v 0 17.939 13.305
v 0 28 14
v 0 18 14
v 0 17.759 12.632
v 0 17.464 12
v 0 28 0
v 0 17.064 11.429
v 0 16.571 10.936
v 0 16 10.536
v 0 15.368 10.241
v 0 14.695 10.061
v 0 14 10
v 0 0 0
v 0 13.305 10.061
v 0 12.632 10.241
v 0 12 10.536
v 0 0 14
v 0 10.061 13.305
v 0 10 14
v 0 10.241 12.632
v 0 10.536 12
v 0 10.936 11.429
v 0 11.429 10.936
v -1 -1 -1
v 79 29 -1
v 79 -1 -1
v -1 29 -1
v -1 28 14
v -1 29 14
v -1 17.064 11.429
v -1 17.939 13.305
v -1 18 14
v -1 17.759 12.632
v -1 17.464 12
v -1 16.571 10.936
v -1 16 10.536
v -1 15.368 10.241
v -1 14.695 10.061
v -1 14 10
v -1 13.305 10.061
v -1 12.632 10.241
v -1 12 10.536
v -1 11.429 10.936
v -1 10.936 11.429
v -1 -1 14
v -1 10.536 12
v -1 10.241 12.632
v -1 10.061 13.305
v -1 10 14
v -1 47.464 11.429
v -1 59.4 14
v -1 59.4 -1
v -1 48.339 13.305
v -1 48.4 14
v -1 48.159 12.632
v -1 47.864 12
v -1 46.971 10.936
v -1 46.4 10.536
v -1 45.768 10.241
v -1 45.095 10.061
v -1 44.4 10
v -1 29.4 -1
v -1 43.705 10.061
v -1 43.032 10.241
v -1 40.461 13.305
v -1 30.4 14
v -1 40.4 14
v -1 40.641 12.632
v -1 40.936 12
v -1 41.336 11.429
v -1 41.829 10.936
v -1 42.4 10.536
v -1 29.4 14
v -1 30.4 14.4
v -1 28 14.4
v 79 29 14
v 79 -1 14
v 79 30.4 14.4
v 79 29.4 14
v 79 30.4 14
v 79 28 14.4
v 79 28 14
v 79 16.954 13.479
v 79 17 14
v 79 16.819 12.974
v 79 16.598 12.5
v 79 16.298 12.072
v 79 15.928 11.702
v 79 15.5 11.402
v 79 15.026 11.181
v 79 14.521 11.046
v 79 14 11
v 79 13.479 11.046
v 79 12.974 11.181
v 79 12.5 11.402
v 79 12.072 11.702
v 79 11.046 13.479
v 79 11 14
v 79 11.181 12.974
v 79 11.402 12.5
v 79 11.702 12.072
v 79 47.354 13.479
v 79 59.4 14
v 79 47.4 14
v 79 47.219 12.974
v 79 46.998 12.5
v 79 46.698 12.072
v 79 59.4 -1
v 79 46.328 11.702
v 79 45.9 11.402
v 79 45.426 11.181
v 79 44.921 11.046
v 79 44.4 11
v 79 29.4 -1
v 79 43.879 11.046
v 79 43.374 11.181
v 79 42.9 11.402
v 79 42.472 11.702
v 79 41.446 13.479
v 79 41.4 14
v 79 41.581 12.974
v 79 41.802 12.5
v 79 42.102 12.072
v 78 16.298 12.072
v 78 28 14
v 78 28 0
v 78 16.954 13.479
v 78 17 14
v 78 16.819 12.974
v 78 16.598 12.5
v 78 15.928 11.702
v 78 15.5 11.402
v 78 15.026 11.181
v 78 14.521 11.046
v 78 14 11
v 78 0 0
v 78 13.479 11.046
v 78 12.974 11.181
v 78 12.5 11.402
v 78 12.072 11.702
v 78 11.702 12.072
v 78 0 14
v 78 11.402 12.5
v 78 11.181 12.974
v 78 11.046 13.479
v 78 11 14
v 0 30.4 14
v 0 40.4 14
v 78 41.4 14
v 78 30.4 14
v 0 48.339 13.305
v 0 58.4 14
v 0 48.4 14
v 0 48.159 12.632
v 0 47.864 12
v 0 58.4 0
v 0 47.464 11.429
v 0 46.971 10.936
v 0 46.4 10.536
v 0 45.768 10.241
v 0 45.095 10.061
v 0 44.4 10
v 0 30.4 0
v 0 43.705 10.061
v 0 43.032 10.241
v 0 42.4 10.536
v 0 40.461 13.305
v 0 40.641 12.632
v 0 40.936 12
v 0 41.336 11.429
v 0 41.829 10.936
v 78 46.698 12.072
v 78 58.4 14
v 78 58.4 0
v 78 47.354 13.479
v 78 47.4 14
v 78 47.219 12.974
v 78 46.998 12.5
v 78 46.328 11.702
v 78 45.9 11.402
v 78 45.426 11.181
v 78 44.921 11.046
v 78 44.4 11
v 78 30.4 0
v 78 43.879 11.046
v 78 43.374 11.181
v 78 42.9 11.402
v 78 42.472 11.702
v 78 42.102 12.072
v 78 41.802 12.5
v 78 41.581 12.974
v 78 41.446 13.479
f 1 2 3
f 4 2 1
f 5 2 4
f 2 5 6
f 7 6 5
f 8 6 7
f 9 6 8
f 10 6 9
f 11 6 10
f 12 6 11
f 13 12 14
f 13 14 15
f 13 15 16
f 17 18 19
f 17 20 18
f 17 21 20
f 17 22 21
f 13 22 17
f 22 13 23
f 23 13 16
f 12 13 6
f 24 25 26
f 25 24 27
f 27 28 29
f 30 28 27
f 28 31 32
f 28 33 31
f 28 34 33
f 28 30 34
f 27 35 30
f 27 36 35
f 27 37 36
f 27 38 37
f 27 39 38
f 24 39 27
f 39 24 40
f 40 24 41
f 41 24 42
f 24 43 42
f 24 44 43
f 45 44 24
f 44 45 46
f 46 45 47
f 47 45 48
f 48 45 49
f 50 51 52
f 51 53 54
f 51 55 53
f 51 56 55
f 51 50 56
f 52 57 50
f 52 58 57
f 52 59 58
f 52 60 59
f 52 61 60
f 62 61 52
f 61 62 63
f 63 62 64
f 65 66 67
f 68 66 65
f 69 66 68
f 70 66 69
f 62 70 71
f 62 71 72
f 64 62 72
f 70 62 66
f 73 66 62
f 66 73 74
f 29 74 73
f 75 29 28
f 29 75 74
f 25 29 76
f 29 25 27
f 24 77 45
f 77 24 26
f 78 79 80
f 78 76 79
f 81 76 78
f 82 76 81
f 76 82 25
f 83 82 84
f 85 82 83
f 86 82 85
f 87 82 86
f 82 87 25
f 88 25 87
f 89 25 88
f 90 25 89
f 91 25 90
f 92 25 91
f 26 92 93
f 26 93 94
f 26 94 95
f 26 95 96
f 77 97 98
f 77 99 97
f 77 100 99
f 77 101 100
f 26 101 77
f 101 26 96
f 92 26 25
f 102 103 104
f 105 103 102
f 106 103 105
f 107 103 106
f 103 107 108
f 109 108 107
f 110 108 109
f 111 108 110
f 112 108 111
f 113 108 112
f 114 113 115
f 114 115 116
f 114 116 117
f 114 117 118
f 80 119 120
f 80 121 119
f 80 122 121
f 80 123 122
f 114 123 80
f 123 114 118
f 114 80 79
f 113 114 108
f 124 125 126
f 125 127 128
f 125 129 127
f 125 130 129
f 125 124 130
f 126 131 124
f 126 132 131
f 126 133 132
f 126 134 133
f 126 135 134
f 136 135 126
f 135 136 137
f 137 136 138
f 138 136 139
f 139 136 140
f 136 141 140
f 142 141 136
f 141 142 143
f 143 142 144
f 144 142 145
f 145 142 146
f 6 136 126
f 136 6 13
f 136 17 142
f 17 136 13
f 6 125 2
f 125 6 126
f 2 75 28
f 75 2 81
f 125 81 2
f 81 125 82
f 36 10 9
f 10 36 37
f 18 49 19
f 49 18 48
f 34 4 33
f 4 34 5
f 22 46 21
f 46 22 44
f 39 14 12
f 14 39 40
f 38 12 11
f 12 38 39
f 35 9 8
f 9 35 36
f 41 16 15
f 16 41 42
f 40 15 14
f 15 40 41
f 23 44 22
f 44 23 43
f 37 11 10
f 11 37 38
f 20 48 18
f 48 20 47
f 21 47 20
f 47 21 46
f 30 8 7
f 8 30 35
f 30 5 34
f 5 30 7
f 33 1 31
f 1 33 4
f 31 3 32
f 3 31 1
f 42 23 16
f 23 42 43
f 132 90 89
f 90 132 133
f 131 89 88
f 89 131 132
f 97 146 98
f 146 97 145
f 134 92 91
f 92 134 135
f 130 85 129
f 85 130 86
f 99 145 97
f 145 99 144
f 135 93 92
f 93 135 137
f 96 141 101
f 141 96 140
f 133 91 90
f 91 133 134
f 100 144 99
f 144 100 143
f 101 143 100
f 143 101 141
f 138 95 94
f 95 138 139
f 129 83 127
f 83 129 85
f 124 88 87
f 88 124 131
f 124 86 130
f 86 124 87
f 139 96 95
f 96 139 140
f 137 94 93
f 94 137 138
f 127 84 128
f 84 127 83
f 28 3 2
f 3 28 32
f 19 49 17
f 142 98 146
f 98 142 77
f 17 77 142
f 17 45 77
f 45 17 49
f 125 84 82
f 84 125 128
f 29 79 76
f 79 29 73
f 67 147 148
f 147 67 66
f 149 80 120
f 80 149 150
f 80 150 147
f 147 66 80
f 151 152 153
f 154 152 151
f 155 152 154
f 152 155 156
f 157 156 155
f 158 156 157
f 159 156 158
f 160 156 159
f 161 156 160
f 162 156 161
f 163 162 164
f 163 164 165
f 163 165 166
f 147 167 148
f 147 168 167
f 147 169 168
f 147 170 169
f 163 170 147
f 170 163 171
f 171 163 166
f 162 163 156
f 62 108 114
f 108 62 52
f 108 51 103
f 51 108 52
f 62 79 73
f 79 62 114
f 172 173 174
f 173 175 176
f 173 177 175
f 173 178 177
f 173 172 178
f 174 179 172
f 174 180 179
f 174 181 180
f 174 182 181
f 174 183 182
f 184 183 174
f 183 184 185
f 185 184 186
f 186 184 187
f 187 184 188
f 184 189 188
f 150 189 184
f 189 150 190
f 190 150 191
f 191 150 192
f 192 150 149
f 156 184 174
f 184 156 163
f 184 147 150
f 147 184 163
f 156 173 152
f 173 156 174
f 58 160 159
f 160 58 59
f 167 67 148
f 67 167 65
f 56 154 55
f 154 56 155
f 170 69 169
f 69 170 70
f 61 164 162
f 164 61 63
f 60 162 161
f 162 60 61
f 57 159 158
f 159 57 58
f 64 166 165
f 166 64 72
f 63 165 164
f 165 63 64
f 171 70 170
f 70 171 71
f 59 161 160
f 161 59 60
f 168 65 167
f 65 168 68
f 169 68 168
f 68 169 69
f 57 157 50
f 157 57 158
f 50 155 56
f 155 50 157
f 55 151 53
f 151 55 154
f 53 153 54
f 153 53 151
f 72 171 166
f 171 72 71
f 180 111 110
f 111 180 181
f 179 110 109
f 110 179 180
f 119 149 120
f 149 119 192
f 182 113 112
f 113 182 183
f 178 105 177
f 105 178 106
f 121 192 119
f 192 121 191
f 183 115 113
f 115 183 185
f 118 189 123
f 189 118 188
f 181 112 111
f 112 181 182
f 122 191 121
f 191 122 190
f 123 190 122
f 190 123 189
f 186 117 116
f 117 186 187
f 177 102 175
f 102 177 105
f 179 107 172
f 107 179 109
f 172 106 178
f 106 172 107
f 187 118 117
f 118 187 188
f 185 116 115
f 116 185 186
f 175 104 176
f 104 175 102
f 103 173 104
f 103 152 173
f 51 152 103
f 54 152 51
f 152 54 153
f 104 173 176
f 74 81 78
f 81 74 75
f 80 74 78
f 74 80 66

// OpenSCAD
$fn=36;

t = 1.0;
l = 78; //länge box
b = 28; //breite box
h = 28; //höhe box
lk = 4; //länge kabel mock
k1d = 8; //kabel1 dicke
k2d = 6; //kabel2 dicke
ab = 0.4; //abstand box
lt = 0.4; //layer thickness

module innen()
{
color("#999999") //innen
cube([l,b,h]); //innen
}

module kabel(kd)
{
color("#666666")
rotate([0,90,0])
cylinder(h=4,d1=kd,d2=kd);
}

module beidekabel()
{
translate([-(lk/2+t),b/2,h/2])
kabel(k1d);

translate([l+t-lk/2,b/2,h/2])
kabel(k2d);
}

module box()
{
//l
translate([-t,-t,-t])
cube([t,b+t*2,h+t*2]);

//r
translate([l,-t,-t])
cube([t,b+t*2,h+t*2]);

//u
translate([0,-t,-t])
cube([l,b+t*2,t]);

//o
translate([0,-t,h])
cube([l,b+t*2,t]);

//v
translate([0,-t,0])
cube([l,t,h]);

//h
translate([0,b,0])
cube([l,t,h]);
}

module boxmitloecher()
{
difference()
{
    box();
    beidekabel();
}
}

module cutbox()
{
color("red")
translate([-t,-t,-t+((h+t*2)/2)])
cube([l+t*2,b+t*2,h+t*2]);
}

module halfbox()
{
difference()
{
    boxmitloecher();
    cutbox();
}
}

halfbox();

translate([0,b+t*2+ab,0])
halfbox();

translate([-t,b,h/2])
cube([l+2*t,2*t+ab,lt]);
